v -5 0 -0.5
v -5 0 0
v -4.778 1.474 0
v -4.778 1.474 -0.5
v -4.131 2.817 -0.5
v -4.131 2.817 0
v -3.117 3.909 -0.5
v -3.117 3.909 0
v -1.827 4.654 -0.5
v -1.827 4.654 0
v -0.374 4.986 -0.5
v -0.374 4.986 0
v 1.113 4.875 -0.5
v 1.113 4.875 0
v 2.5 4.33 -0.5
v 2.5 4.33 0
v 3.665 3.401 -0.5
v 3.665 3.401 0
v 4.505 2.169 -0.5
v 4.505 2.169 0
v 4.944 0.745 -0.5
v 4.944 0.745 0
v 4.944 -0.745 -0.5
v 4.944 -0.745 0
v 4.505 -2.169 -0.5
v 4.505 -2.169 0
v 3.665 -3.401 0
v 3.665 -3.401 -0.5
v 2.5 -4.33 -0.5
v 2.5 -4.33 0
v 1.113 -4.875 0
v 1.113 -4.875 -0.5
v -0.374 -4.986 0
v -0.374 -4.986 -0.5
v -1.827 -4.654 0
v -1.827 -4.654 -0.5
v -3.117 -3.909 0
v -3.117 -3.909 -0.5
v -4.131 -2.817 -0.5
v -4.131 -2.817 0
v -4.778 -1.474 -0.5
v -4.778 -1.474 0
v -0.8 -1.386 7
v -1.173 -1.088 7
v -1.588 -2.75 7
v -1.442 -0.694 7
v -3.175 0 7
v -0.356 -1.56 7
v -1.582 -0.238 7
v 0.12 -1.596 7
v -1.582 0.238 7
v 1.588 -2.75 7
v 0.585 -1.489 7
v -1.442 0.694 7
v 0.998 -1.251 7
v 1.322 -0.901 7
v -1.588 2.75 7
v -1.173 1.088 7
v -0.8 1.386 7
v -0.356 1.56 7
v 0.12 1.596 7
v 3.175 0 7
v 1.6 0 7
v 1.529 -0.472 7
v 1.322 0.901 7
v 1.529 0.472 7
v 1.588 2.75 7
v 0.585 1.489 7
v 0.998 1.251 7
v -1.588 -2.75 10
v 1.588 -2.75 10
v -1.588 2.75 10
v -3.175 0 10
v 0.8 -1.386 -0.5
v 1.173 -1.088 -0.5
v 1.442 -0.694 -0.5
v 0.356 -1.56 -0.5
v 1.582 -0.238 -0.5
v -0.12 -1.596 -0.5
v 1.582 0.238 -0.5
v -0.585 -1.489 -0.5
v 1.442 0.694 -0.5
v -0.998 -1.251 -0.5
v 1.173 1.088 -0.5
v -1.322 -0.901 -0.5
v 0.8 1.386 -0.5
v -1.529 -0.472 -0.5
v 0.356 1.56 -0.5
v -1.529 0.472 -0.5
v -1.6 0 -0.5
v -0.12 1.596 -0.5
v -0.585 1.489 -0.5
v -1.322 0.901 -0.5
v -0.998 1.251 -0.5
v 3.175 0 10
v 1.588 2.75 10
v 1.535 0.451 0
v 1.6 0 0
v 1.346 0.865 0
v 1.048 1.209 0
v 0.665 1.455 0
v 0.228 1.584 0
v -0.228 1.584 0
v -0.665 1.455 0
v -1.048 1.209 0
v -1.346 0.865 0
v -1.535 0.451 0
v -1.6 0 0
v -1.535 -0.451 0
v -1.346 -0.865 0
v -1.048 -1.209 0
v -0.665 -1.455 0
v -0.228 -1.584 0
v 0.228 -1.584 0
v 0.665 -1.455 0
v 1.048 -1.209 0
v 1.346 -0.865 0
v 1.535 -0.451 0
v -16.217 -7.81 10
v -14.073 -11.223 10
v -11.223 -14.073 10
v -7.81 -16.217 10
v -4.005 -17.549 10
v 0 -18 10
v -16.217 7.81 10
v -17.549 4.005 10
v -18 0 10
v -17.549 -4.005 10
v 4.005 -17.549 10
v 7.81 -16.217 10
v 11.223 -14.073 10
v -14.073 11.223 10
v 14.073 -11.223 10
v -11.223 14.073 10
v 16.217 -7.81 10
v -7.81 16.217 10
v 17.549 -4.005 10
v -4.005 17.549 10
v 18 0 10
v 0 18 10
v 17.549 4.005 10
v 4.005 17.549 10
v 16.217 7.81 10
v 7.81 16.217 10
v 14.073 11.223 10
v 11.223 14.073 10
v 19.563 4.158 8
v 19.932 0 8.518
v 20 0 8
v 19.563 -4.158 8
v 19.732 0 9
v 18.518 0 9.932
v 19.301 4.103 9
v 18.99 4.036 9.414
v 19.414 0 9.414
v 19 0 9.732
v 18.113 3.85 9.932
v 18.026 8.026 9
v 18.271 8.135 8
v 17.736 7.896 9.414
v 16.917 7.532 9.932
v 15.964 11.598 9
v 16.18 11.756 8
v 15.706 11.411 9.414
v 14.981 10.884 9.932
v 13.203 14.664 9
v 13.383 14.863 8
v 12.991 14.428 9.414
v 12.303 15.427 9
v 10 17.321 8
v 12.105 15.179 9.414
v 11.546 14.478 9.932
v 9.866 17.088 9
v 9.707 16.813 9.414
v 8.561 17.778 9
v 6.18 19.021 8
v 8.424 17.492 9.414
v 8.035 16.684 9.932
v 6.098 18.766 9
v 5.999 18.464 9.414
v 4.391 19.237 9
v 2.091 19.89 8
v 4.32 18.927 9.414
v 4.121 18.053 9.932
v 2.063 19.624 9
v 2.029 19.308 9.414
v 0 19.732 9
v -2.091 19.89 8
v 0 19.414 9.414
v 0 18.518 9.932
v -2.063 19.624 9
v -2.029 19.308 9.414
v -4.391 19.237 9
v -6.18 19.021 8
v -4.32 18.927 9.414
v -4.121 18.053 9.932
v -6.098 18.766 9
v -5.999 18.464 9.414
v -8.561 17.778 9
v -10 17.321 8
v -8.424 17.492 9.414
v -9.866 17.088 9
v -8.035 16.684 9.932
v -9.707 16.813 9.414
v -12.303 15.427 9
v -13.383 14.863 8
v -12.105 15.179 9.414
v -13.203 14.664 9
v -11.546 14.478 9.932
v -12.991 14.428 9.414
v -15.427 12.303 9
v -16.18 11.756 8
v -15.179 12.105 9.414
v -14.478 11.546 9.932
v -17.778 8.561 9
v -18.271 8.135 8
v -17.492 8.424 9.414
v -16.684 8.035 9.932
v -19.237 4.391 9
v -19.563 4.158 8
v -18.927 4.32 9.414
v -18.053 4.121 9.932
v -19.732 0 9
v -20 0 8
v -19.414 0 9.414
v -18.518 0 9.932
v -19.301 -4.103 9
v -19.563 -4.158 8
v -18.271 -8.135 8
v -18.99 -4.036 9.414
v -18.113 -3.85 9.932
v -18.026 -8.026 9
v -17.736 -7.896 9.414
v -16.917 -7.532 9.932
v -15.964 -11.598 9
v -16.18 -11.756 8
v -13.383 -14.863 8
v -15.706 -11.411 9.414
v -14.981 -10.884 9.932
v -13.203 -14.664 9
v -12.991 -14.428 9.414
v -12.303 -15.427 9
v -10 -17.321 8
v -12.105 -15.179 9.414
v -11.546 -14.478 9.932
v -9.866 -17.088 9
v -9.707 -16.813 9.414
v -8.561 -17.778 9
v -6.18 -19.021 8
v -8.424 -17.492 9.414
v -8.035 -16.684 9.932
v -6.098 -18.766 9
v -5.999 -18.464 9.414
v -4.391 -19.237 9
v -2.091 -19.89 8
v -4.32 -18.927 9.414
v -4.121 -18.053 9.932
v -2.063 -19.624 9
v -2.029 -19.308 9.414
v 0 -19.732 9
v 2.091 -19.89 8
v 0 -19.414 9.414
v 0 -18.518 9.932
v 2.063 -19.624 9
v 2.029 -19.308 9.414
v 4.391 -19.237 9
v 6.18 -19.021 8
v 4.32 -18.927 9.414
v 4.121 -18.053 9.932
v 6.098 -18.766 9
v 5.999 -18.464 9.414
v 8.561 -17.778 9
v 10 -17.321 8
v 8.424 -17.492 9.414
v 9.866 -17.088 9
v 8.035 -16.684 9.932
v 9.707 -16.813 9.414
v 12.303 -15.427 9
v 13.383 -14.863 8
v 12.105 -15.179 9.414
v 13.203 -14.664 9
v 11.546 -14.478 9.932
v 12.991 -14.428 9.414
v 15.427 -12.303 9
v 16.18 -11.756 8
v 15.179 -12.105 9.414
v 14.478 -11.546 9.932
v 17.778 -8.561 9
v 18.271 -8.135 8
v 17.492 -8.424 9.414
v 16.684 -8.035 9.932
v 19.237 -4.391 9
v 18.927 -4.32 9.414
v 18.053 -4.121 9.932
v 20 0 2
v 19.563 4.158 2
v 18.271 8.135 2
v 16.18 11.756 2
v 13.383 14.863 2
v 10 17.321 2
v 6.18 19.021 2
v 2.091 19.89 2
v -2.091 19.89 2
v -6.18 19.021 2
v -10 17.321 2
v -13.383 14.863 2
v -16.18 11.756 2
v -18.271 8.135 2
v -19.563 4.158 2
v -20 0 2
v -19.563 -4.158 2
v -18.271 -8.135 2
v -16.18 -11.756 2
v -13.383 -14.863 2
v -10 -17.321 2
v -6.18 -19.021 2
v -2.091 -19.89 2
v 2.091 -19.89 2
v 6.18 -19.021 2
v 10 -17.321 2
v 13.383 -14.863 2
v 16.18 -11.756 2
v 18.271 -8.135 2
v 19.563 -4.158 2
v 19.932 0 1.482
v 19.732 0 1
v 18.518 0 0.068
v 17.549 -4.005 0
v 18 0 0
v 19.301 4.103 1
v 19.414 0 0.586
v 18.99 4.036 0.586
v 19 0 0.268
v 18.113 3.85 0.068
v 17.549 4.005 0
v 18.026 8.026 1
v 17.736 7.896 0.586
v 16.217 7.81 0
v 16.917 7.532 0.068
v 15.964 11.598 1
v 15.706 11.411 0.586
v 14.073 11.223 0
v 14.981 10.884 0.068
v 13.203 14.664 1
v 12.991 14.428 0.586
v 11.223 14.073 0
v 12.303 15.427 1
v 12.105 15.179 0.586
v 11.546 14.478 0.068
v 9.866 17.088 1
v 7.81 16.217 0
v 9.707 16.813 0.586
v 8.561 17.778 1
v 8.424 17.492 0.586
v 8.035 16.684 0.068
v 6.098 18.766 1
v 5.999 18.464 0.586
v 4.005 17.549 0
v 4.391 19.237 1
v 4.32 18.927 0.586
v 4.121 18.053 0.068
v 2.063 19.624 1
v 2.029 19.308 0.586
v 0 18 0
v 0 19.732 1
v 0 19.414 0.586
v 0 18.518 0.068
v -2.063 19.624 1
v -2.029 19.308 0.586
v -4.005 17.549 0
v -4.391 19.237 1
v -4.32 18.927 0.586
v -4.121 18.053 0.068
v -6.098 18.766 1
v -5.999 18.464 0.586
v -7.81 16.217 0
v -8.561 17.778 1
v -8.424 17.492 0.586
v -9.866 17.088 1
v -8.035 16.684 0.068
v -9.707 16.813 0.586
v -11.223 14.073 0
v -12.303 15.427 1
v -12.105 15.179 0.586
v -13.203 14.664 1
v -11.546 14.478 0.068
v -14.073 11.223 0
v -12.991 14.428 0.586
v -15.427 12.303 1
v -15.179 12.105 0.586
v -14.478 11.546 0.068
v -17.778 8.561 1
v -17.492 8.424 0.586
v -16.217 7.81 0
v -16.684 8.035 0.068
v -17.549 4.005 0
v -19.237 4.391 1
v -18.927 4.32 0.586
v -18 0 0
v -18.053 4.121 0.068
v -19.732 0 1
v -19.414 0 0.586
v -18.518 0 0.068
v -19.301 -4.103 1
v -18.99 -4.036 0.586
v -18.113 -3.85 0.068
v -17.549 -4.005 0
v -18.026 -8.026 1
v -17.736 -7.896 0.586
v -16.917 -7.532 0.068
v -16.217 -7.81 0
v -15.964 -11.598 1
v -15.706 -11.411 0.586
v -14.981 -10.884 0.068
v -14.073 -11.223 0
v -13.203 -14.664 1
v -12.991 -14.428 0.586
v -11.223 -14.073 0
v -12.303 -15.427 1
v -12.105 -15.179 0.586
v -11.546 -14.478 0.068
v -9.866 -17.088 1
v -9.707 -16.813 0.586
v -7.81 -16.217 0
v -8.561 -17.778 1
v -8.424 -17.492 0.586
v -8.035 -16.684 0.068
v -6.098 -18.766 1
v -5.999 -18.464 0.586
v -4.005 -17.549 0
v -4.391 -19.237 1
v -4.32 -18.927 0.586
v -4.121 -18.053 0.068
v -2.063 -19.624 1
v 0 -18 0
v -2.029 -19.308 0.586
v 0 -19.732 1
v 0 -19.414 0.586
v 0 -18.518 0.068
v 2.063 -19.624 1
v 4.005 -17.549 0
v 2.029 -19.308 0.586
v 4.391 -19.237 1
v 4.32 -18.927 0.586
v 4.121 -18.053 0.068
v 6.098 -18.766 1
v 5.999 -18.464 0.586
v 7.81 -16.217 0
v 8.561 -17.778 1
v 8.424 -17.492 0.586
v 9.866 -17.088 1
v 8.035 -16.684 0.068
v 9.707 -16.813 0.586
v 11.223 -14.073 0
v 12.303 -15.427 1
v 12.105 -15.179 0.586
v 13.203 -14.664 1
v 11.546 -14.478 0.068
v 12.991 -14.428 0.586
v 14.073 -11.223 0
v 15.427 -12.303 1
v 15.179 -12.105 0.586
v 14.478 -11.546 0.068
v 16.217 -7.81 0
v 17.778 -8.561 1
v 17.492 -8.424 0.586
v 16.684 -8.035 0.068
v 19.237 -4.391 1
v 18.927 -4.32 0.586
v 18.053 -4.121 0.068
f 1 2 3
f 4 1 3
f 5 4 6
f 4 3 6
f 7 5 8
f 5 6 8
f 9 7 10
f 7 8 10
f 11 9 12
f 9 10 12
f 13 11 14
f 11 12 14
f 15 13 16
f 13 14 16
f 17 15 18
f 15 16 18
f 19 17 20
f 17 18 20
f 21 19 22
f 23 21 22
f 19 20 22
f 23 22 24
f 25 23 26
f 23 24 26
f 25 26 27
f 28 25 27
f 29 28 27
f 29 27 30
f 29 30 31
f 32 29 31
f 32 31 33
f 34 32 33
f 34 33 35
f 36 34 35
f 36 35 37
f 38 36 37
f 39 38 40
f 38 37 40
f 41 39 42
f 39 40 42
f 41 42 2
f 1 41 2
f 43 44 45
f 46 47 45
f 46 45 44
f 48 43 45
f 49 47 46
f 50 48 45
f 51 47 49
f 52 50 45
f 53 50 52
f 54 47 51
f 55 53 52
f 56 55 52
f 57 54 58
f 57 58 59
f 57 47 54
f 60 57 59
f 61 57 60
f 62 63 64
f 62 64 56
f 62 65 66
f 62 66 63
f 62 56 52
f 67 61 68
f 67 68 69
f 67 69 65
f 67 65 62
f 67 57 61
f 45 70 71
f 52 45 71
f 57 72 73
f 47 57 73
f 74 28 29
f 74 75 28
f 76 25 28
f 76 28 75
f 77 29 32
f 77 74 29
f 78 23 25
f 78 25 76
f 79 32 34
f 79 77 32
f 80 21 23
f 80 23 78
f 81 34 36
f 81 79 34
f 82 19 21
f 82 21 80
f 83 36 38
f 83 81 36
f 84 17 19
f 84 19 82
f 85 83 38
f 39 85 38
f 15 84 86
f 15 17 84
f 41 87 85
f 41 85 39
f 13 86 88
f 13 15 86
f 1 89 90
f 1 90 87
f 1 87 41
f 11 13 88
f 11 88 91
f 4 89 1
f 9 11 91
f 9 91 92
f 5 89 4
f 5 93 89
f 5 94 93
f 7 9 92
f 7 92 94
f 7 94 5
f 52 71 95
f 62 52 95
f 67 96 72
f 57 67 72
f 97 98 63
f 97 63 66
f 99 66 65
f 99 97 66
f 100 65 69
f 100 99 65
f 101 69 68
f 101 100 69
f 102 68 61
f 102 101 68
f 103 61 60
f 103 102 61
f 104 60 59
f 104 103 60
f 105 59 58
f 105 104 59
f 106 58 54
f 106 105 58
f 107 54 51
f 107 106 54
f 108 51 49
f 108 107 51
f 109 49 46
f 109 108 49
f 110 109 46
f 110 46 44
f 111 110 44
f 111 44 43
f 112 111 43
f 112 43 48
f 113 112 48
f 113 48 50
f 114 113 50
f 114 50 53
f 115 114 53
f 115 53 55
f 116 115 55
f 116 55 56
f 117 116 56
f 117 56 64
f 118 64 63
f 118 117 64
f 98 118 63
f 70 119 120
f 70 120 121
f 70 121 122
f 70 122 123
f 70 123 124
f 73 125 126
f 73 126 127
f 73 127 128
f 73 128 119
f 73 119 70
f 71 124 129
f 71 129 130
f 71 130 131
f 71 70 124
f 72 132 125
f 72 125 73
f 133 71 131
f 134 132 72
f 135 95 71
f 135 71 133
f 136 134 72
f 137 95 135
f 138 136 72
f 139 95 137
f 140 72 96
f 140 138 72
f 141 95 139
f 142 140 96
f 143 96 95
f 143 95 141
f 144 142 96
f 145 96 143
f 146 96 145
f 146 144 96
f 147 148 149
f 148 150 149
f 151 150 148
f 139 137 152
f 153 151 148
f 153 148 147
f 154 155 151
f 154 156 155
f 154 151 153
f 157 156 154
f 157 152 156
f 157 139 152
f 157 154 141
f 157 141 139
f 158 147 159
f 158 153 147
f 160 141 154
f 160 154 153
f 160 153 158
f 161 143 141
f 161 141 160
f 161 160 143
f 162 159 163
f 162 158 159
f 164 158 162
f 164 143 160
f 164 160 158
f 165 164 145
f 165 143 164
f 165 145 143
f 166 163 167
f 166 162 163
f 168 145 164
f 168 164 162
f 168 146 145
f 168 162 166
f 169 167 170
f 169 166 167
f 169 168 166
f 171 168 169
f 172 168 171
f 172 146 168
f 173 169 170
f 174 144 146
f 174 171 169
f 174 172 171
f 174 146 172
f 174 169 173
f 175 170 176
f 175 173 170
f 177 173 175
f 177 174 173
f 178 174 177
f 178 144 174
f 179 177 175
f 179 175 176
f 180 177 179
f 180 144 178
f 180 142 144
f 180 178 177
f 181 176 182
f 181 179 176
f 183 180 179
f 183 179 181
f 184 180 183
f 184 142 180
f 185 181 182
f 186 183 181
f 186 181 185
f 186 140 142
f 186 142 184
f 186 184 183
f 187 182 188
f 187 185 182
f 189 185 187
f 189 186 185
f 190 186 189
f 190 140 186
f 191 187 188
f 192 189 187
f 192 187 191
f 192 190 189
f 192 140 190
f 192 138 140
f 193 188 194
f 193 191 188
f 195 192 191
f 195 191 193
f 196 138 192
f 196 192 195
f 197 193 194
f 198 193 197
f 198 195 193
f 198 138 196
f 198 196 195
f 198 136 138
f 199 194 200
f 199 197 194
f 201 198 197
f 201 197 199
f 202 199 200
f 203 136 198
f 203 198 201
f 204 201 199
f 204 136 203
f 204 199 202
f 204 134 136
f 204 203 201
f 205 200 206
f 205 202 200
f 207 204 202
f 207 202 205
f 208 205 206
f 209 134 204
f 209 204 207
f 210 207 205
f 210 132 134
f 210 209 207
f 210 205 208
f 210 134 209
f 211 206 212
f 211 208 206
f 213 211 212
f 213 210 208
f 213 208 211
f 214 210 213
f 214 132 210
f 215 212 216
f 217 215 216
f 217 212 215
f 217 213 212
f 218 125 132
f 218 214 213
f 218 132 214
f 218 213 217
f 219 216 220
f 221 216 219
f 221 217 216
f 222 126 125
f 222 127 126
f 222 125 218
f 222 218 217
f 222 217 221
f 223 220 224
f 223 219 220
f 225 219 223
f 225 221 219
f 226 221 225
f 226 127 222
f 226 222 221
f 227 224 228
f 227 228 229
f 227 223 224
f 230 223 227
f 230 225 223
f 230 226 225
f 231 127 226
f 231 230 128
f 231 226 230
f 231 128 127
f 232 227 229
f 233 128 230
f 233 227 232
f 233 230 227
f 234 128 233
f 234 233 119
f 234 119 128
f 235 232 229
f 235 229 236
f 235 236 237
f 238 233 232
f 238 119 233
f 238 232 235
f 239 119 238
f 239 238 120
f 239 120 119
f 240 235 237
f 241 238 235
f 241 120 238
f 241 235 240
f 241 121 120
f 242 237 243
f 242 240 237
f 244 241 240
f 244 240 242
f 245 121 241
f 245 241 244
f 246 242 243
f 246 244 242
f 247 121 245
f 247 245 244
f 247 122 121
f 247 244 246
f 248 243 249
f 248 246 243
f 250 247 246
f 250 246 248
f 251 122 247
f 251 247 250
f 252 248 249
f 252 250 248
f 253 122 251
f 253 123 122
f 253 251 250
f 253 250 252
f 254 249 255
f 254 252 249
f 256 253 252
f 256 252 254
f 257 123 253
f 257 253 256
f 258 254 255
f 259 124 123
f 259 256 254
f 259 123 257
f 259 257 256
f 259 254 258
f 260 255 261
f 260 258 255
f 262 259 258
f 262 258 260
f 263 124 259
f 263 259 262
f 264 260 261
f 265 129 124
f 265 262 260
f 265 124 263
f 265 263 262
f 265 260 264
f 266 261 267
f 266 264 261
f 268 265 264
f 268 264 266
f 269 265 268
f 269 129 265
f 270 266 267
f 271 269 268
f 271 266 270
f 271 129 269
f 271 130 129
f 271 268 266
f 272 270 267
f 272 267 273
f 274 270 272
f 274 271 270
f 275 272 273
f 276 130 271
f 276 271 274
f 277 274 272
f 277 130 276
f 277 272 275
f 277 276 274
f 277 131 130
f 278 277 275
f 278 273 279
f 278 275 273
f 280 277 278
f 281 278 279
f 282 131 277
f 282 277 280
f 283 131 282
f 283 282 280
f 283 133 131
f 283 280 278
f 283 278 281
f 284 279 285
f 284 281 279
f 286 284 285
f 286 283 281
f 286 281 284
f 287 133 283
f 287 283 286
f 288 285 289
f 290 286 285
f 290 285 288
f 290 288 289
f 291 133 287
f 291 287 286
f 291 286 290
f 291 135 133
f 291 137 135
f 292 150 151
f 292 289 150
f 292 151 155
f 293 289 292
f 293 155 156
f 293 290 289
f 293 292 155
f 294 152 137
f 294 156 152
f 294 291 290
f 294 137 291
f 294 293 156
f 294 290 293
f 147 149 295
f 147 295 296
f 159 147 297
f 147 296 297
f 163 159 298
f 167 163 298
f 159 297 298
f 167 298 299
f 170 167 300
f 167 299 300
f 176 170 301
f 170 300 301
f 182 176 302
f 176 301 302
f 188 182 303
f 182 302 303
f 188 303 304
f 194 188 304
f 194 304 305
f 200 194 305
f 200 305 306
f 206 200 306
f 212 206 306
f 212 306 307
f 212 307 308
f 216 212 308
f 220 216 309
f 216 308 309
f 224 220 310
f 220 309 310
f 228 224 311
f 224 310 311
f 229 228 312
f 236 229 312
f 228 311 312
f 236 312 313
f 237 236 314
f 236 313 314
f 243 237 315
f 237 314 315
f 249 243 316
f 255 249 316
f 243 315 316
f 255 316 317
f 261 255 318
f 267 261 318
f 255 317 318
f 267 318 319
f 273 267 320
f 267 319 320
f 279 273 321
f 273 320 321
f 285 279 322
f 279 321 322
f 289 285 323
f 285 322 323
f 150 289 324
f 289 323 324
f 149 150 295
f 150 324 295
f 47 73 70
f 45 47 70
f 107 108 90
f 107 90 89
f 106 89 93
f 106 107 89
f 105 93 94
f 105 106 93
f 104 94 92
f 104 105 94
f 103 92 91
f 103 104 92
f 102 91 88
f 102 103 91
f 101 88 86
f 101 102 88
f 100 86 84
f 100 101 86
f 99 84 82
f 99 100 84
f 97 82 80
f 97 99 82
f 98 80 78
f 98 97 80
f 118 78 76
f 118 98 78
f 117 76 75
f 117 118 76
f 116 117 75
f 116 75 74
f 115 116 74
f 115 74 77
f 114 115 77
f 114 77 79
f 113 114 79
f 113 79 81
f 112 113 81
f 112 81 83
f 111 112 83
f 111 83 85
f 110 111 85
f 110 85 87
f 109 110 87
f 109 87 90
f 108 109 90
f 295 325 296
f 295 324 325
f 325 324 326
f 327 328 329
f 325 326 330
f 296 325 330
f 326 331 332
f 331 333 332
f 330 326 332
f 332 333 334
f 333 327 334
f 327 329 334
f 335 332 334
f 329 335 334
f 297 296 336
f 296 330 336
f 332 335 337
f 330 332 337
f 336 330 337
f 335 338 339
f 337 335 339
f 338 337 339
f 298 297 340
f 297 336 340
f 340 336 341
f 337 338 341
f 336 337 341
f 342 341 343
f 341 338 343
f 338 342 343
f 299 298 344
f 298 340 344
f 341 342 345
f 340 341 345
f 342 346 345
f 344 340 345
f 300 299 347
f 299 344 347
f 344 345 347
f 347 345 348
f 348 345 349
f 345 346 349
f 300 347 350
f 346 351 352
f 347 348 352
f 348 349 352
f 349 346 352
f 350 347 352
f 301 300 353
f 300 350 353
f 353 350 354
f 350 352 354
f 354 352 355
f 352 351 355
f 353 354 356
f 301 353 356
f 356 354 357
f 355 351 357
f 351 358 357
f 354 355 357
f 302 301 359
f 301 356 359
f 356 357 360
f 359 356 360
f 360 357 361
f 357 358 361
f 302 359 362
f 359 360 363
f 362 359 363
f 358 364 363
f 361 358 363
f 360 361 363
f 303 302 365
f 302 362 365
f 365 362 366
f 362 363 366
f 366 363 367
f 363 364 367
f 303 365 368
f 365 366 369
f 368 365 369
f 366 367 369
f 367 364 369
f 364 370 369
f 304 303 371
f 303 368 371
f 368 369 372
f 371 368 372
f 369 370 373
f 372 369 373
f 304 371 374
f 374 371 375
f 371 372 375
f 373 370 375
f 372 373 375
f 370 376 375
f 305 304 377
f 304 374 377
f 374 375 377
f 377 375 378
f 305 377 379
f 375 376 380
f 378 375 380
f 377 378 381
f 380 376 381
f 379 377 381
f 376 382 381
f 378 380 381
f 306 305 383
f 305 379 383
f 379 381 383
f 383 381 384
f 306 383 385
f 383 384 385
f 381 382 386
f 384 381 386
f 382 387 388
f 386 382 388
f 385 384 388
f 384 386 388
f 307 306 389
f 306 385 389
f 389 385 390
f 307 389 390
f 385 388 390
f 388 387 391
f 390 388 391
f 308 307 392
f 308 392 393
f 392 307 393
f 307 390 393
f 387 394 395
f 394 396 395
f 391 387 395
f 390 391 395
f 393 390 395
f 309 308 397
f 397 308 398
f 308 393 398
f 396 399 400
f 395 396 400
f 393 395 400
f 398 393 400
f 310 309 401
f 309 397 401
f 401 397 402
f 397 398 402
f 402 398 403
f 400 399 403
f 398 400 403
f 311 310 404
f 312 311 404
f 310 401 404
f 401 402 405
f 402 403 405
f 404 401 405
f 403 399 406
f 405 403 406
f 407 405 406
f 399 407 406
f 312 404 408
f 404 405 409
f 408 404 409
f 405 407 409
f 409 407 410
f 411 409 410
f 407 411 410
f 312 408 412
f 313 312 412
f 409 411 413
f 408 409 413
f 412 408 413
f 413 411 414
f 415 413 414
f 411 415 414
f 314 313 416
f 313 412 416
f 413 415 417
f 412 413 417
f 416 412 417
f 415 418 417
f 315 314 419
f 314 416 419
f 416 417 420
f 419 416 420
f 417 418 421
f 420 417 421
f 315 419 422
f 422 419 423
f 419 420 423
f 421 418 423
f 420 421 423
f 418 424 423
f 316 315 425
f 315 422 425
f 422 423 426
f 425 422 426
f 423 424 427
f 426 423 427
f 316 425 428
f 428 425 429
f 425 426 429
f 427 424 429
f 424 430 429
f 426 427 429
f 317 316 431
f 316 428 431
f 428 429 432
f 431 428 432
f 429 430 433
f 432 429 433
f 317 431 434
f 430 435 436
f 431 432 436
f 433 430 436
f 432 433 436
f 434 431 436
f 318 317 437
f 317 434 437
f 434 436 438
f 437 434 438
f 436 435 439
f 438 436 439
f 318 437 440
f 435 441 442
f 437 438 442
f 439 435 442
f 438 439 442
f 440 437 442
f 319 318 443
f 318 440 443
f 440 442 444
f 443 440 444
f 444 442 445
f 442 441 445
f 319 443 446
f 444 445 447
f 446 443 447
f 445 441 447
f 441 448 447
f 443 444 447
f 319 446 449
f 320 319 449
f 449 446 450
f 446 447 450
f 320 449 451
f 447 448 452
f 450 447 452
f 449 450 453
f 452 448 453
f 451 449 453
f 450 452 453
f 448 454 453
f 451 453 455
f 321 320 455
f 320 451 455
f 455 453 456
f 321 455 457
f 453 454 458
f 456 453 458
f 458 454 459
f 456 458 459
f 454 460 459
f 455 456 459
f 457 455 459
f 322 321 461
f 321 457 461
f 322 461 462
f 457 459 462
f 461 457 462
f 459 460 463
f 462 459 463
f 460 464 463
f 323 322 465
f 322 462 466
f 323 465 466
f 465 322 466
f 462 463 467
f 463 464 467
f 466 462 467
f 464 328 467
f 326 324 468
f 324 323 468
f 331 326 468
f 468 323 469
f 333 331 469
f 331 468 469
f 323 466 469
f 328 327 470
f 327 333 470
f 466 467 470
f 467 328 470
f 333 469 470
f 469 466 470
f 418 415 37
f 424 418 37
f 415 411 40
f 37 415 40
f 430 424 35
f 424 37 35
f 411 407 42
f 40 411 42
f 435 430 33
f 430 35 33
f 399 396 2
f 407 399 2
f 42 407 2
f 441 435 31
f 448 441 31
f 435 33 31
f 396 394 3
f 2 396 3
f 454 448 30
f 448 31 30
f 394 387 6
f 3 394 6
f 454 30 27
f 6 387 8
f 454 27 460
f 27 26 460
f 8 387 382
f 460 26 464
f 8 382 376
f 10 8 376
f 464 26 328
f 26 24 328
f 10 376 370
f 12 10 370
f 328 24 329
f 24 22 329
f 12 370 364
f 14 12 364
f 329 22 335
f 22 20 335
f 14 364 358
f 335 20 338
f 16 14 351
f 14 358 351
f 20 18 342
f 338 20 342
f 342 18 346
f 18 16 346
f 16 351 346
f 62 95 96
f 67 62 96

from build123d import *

# Parameters (mm, degrees)
SCHIZZO1_R                   = 20
SCHIZZO1_R_2                 = 1.6
ESTRUSIONE_ESTRUSIONE1_DEPTH = 10
TAGLIO_ESTRUSIONE1_DEPTH     = 3
RACCORDO1_R                  = 2
SCHIZZO3_R                   = 5
SCHIZZO3_R_2                 = 1.6
ESTRUSIONE_ESTRUSIONE2_DEPTH = 0.5


with BuildPart() as part:
    # Schizzo1 → Estrusione-Estrusione1 (new body)
    with BuildSketch(Plane.XY):
        Circle(SCHIZZO1_R)
        Circle(SCHIZZO1_R_2, mode=Mode.SUBTRACT)
    extrude(amount=ESTRUSIONE_ESTRUSIONE1_DEPTH)

    # Schizzo2 → Taglio-Estrusione1 (cut)
    with BuildSketch(Plane.XY.offset(10)):
        Polygon((3.175426481, 0), (1.58771324, 2.75), (-1.58771324, 2.75), (-3.175426481, 0), (-1.58771324, -2.75), (1.58771324, -2.75), align=None)
    extrude(amount=-TAGLIO_ESTRUSIONE1_DEPTH, mode=Mode.SUBTRACT)

    # Raccordo1
    raccordo1_edges = [part.edges().sort_by_distance(p)[0] for p in [
        (-20, 0, 0),
        (-20, 0, 10),
    ]]
    fillet(raccordo1_edges, radius=RACCORDO1_R)

    # Schizzo3 → Estrusione-Estrusione2 (add)
    with BuildSketch(Plane(origin=(0, 0, 0), x_dir=(-1, 0, 0), z_dir=(0, 0, -1))):
        Circle(SCHIZZO3_R)
        Circle(SCHIZZO3_R_2, mode=Mode.SUBTRACT)
    extrude(amount=ESTRUSIONE_ESTRUSIONE2_DEPTH)


solid = part.part
